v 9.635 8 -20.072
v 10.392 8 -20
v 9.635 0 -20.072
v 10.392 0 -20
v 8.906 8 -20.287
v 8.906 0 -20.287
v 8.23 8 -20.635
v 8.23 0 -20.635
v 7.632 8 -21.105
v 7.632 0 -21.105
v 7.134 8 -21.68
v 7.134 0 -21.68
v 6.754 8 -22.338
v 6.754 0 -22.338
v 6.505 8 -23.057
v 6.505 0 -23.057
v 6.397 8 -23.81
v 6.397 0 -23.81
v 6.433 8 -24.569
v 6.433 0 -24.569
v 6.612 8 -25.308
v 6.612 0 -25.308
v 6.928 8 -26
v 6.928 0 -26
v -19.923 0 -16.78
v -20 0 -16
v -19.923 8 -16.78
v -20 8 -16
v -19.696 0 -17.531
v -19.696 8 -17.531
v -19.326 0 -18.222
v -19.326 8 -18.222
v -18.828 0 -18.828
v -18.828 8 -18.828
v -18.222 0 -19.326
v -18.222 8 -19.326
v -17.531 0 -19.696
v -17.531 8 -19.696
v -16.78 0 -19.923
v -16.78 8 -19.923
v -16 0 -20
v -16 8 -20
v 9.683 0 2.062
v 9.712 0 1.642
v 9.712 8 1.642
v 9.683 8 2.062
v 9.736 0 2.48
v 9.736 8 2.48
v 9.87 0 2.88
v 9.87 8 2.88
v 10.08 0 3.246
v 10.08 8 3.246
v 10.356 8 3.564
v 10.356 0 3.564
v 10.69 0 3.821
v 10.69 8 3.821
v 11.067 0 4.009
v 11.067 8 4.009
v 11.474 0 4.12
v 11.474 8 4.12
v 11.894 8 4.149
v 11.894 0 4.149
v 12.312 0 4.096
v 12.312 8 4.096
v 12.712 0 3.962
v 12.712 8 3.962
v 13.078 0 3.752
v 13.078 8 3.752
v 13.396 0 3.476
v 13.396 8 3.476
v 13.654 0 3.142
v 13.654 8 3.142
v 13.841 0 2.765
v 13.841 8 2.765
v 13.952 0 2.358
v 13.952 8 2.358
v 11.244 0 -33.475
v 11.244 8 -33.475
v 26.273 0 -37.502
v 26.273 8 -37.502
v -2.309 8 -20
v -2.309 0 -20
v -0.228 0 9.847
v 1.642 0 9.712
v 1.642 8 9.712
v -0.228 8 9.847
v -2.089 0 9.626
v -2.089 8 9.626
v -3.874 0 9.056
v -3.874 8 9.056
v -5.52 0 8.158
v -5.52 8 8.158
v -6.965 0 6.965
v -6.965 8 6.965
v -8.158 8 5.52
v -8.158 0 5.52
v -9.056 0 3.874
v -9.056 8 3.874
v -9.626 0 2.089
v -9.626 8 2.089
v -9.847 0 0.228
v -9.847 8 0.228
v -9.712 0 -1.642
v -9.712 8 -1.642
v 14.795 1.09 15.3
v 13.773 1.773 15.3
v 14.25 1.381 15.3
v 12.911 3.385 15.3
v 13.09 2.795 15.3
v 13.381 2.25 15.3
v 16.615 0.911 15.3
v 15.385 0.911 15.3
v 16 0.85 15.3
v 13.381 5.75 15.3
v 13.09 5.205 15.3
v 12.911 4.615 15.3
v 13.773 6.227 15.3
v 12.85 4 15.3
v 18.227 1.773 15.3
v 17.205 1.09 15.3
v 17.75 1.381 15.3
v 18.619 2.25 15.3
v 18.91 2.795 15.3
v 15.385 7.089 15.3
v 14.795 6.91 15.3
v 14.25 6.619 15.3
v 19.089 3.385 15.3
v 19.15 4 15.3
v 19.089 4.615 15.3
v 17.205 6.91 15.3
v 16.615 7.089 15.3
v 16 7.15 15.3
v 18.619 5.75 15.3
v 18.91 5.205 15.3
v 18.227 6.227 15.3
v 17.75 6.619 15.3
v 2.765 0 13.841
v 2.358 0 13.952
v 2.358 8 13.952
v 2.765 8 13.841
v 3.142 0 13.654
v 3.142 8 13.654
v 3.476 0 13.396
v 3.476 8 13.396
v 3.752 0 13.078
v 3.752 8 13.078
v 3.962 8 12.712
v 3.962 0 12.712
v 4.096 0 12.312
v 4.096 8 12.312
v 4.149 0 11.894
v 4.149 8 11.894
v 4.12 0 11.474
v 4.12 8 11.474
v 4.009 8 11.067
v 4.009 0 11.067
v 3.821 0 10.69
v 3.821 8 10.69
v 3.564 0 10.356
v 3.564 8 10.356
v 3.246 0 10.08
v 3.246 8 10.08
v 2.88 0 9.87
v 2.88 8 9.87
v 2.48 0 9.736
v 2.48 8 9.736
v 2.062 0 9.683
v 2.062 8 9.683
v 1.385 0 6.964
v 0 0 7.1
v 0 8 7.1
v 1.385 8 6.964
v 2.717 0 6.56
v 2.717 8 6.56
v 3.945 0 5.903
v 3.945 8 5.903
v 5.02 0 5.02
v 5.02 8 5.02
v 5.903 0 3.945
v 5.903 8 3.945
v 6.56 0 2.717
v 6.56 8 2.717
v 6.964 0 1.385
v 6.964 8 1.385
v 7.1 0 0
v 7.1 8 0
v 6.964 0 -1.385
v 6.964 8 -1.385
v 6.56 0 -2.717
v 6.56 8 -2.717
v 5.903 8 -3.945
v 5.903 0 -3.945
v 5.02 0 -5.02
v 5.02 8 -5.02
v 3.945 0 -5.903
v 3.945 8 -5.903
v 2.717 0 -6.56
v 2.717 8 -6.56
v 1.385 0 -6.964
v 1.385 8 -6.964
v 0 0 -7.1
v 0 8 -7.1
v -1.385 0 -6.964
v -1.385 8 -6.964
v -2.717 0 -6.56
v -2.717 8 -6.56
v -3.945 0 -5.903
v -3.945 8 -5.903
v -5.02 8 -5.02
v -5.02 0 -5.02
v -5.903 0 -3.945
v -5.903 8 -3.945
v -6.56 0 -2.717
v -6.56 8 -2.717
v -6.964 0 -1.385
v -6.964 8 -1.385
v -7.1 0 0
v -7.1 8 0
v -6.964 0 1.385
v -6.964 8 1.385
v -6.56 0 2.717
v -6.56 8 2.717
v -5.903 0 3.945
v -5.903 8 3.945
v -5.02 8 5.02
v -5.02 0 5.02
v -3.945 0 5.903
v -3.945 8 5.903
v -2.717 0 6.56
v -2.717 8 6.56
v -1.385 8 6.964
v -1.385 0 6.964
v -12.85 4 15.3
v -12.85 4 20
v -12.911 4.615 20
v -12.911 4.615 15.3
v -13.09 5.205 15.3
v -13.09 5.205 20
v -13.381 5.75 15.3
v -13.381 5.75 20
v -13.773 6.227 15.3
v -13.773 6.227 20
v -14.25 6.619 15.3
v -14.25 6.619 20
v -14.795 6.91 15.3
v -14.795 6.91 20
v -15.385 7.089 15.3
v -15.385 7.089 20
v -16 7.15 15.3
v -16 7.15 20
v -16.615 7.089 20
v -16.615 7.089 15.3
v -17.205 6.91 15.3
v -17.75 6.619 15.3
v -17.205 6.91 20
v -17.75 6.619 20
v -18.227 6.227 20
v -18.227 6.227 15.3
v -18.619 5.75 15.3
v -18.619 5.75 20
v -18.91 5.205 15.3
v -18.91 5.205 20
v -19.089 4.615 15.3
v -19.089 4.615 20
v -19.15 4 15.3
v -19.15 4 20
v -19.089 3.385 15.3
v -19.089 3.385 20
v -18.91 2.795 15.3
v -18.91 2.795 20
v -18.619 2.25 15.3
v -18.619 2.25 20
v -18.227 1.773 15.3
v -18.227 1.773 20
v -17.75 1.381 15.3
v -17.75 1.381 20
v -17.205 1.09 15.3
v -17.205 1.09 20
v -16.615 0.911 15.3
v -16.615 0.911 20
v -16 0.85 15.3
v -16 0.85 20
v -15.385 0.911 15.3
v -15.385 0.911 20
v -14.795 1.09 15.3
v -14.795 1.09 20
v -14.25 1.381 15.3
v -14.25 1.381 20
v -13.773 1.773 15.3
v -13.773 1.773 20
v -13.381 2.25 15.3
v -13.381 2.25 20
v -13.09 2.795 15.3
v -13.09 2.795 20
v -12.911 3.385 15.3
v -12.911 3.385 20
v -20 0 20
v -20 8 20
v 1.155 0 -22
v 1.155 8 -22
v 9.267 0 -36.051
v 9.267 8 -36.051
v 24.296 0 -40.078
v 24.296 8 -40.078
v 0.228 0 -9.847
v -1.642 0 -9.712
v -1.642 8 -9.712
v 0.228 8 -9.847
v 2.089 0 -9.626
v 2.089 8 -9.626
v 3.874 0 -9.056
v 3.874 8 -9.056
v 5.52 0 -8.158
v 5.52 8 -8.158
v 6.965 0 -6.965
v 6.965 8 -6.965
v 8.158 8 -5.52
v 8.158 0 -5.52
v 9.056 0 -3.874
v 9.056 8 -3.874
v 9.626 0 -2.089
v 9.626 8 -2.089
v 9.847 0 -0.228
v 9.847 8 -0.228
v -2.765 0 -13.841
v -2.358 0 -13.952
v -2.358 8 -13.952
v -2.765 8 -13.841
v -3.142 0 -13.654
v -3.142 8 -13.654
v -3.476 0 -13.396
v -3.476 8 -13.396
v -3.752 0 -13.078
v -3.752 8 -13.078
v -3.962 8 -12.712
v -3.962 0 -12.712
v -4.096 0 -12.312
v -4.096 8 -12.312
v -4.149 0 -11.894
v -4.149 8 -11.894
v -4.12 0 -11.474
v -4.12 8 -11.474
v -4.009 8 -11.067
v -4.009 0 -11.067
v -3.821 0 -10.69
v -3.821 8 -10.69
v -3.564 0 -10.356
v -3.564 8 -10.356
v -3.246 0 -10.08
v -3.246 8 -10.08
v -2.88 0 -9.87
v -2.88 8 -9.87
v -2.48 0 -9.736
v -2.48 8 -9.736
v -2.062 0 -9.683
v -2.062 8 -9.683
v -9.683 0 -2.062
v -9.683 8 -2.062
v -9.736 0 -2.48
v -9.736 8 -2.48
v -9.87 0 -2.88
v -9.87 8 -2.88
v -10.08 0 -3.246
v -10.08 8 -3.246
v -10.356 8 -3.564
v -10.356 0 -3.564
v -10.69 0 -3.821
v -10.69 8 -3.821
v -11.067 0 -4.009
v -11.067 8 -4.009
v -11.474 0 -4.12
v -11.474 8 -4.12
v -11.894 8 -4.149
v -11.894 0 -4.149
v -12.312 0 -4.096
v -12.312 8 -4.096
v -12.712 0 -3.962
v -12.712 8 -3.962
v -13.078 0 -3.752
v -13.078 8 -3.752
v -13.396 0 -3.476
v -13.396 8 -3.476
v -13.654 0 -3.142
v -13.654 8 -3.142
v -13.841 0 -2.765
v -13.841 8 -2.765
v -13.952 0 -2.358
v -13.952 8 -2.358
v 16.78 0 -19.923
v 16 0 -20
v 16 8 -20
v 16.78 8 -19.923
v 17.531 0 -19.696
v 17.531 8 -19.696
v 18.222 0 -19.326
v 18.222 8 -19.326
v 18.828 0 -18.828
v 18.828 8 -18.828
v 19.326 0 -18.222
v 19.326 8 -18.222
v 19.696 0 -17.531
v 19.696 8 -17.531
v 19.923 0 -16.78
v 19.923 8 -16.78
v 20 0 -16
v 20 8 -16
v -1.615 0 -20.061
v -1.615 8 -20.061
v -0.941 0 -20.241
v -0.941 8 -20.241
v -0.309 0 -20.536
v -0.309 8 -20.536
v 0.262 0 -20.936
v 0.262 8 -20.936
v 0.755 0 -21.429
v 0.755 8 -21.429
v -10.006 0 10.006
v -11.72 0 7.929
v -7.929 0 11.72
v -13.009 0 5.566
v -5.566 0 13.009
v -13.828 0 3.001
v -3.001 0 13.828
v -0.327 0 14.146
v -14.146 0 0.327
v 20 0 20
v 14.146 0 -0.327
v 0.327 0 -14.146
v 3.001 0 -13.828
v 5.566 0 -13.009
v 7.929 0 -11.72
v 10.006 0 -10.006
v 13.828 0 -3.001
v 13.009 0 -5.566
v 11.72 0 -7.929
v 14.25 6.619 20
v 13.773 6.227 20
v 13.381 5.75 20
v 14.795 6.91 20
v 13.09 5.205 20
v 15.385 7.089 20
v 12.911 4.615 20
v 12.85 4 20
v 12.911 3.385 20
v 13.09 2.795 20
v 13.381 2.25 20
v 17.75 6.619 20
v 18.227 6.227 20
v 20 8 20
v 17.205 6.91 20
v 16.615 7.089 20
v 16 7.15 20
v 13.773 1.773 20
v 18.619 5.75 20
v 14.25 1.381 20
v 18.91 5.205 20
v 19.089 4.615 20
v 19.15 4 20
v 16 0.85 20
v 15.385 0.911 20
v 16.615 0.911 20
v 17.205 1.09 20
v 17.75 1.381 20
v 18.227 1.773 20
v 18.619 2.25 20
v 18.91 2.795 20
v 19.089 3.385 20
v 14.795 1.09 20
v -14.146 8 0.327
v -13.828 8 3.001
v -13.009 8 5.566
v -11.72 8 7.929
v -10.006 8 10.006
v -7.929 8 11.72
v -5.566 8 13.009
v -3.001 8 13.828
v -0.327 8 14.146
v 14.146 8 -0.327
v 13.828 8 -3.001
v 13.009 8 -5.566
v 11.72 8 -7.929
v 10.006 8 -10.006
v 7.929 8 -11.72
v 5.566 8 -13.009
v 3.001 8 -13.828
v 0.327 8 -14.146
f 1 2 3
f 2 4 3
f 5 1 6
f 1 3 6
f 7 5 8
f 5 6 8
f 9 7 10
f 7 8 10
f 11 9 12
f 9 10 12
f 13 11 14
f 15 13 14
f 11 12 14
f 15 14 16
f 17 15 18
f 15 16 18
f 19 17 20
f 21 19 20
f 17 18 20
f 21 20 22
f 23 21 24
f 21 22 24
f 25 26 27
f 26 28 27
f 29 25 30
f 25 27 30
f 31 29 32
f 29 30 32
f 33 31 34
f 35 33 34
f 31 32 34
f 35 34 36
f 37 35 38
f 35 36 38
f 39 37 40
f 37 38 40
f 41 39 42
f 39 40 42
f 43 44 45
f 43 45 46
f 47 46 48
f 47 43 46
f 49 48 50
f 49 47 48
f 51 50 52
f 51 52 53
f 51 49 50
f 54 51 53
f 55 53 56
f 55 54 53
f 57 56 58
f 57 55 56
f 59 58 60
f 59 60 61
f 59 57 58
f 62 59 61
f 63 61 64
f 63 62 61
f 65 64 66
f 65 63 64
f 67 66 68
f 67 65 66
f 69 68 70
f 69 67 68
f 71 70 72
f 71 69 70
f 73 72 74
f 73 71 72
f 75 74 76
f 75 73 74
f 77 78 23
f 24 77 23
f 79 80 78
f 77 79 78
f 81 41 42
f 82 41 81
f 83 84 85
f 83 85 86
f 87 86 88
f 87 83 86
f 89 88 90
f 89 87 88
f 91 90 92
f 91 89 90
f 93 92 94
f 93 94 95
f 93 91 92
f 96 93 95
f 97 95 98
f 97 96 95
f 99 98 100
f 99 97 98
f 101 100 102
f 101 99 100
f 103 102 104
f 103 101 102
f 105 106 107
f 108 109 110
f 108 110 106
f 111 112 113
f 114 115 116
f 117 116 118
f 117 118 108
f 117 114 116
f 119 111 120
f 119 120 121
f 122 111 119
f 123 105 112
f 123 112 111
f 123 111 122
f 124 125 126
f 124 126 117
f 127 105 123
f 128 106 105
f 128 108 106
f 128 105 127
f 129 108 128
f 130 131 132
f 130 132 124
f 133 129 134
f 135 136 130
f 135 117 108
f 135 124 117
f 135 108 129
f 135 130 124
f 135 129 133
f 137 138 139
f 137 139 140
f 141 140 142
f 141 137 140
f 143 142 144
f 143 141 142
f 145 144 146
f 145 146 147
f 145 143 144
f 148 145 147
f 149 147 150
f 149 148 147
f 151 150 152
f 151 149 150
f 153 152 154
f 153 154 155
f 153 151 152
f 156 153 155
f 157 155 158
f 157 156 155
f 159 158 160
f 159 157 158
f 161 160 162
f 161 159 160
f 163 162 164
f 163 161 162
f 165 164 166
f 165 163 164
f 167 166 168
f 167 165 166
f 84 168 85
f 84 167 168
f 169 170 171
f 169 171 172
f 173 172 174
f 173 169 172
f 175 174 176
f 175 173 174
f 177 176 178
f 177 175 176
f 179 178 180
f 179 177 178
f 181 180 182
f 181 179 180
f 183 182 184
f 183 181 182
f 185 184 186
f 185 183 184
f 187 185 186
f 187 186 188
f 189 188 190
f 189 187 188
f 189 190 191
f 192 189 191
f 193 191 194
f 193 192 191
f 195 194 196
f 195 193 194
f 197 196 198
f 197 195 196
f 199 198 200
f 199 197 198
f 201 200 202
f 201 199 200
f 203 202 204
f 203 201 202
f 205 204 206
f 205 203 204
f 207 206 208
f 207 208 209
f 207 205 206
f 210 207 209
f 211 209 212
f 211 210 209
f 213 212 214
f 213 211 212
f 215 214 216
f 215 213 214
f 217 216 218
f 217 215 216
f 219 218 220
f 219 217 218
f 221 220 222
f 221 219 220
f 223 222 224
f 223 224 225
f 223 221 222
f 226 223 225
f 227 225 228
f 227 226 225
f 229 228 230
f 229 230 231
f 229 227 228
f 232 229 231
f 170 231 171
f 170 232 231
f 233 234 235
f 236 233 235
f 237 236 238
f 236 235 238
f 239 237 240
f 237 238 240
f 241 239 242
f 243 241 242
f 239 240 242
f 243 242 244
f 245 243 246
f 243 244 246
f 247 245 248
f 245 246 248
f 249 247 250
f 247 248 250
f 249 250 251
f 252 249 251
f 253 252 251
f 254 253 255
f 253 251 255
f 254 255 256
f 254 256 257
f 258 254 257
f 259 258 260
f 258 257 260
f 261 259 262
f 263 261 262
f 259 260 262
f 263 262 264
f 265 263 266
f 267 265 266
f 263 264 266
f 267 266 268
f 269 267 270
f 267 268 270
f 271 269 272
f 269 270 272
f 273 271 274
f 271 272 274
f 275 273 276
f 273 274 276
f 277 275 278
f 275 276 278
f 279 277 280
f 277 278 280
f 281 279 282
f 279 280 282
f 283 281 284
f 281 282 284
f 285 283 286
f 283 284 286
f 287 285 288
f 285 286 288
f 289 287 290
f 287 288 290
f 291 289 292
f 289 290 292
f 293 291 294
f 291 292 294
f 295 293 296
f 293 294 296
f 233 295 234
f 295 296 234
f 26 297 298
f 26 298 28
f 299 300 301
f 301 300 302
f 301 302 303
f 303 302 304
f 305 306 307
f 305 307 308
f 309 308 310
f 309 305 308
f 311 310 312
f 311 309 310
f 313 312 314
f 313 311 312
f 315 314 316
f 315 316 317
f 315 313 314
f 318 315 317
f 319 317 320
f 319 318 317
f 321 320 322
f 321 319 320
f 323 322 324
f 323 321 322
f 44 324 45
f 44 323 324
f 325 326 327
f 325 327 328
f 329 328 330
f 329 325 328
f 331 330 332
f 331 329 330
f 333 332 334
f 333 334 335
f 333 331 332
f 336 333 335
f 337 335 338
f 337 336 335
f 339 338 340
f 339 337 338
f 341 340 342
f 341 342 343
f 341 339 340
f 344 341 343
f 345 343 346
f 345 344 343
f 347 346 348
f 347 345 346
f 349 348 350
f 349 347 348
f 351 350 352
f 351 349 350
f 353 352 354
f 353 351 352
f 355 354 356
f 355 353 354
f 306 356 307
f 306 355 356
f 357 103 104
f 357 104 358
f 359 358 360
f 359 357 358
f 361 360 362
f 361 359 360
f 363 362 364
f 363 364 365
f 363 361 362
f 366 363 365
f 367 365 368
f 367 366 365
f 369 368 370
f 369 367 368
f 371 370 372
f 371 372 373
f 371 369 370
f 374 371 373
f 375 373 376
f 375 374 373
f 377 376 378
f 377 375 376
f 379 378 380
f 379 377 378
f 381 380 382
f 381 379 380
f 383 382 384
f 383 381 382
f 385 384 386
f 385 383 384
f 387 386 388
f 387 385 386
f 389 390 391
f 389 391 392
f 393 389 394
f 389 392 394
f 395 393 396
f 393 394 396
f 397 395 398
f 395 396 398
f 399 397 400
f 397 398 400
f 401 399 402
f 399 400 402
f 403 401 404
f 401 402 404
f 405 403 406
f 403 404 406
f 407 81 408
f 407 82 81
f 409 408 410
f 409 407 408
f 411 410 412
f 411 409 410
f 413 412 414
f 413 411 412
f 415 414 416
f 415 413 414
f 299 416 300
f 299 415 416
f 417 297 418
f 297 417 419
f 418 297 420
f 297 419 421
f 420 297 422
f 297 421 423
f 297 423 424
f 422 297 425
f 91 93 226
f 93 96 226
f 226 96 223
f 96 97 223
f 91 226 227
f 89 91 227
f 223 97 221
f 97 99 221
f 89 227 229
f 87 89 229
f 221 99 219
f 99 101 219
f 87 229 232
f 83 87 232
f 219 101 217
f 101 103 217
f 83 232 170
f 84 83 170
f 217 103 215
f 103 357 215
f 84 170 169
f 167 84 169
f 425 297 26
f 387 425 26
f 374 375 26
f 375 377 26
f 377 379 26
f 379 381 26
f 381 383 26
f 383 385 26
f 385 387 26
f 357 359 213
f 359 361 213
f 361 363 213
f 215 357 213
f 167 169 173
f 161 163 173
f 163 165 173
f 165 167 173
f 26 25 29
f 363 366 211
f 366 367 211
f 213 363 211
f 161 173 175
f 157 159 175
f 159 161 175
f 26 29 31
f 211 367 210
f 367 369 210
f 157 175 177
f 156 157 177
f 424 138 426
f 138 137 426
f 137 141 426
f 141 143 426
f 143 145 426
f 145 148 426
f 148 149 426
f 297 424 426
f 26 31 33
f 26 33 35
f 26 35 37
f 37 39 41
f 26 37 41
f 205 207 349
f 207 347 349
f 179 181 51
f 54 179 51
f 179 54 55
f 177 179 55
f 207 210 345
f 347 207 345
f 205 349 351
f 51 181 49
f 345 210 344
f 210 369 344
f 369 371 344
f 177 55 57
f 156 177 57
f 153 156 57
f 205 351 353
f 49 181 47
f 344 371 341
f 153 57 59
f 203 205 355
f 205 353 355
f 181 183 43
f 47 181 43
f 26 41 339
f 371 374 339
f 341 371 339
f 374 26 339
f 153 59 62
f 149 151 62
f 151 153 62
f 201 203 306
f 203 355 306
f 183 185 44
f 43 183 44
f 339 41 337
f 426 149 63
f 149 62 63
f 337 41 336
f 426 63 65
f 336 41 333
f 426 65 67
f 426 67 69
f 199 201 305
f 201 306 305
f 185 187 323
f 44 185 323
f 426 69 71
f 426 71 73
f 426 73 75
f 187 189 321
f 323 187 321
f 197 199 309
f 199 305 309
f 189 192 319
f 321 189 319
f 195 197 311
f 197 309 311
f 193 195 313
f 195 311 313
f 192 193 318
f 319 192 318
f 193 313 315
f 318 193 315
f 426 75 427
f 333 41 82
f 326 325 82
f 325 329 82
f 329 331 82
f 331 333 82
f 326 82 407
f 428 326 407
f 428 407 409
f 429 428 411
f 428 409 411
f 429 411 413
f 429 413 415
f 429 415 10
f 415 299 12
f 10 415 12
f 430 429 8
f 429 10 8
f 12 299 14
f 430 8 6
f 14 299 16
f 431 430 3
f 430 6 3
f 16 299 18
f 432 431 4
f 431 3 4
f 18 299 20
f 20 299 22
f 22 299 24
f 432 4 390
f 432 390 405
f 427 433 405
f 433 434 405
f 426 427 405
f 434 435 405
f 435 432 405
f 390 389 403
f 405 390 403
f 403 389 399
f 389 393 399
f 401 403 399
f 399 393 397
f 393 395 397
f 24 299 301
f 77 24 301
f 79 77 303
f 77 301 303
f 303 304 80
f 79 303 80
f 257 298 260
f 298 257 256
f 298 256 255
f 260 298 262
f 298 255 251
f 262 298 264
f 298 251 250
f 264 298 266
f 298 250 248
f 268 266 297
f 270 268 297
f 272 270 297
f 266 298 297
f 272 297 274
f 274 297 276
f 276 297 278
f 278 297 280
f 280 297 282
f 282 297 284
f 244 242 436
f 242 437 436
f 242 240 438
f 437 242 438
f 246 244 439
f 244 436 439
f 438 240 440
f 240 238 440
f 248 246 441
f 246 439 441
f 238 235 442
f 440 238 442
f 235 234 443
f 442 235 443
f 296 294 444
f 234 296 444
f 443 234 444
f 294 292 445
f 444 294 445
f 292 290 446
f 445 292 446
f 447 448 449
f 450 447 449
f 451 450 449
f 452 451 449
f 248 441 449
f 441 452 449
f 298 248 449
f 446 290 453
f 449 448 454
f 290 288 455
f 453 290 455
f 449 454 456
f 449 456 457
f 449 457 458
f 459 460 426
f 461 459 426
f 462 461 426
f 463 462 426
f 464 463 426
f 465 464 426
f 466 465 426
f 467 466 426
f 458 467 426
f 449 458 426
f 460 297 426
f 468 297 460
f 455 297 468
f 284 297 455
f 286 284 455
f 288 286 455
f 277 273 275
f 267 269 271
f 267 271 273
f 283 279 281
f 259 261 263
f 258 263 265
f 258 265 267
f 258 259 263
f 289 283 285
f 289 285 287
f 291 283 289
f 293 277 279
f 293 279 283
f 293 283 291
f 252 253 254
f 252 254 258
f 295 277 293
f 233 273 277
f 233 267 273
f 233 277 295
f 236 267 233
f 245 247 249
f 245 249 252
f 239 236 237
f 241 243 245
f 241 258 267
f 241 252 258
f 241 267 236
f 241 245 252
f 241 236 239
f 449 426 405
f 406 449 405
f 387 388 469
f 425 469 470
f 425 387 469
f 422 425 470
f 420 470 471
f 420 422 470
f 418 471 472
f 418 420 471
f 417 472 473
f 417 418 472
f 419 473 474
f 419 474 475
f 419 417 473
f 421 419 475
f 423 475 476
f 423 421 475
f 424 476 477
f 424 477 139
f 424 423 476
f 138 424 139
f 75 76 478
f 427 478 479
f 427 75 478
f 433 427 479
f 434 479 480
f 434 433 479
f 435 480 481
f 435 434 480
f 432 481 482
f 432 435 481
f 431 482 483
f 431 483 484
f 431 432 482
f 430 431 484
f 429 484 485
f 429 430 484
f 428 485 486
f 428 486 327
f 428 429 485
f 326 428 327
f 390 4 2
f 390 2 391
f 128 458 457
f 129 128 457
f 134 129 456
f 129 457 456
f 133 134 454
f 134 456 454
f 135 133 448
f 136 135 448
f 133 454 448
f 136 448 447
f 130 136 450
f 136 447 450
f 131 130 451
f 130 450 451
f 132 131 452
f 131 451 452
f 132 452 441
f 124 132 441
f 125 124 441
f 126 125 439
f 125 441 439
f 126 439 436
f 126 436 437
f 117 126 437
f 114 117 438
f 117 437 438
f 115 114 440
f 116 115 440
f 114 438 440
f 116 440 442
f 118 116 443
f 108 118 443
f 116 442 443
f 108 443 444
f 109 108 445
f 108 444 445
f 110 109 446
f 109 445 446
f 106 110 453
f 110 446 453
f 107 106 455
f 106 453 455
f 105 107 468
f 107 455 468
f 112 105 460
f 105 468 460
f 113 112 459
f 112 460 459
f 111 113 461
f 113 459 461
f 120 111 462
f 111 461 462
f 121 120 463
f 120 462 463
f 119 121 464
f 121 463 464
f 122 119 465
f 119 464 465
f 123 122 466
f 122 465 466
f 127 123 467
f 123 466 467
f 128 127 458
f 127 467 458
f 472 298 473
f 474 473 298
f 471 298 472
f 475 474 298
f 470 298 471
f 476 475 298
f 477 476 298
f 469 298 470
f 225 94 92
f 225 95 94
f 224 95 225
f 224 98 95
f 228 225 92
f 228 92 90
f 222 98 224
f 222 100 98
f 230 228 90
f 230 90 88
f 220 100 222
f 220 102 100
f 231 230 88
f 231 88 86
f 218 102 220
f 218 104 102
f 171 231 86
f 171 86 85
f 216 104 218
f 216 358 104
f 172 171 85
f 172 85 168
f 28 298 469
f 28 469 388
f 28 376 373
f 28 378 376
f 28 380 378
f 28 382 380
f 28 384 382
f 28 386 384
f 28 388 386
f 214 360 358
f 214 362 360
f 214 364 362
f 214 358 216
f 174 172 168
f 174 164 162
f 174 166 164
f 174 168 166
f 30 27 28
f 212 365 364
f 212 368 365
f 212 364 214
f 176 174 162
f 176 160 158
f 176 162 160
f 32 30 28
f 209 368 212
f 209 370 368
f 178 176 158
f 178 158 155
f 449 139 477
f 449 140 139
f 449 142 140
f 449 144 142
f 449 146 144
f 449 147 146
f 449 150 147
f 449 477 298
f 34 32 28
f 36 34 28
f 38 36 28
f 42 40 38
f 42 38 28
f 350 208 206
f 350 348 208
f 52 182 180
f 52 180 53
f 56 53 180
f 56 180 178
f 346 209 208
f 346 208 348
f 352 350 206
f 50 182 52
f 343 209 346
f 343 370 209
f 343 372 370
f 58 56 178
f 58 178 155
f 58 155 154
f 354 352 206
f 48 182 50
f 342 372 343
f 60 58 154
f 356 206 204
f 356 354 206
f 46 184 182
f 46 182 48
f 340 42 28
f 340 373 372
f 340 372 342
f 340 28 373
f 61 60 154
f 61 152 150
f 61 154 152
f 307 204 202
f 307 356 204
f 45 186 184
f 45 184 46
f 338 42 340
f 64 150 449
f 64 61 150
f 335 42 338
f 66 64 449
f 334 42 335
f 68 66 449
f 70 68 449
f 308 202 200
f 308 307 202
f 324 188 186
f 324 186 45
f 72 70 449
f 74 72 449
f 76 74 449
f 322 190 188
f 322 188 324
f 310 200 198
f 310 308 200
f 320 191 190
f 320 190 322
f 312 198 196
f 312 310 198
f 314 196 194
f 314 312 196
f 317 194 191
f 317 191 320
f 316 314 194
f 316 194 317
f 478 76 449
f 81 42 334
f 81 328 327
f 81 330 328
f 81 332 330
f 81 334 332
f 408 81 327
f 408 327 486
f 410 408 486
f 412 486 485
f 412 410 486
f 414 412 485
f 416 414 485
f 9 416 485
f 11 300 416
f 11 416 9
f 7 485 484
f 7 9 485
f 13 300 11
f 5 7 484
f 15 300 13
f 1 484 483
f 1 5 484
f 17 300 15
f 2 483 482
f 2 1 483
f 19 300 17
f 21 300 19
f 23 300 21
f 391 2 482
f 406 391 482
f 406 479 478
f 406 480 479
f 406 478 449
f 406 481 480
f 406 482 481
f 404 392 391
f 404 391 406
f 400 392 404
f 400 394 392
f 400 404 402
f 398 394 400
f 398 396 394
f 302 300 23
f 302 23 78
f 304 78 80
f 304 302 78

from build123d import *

# Parameters (mm, degrees)
SKETCH1_W           = 40
SKETCH1_H           = 40
SKETCH1_R           = 7.1
BOSS_EXTRUDE1_DEPTH = 8
FILLET1_R           = 4
SKETCH2_R           = 3.15
CUT_EXTRUDE1_DEPTH  = 4.7
BOSS_EXTRUDE2_DEPTH = 8
FILLET2_R           = 4


with BuildPart() as part:
    # Sketch1 → Boss-Extrude1 (new body)
    with BuildSketch(Plane(origin=(0, 0, 0), x_dir=(1, 0, 0), z_dir=(0, 1, 0))):
        Rectangle(SKETCH1_W, SKETCH1_H)
        with Locations(Location((0, 0, 0), (0, 0, 270))):
            Circle(SKETCH1_R, mode=Mode.SUBTRACT)
        with BuildLine():
            ThreePointArc((-1.641666667, 9.712230977), (6.965001795, 6.965001795), (9.712230977, -1.641666667))
            ThreePointArc((9.712230977, -1.641666667), (11.473826233, -4.119928589), (13.952088155, -2.358333333))
            ThreePointArc((13.952088155, -2.358333333), (10.005560954, 10.005560954), (-2.358333333, 13.952088155))
            ThreePointArc((-2.358333333, 13.952088155), (-4.119928589, 11.473826233), (-1.641666667, 9.712230977))
        make_face(mode=Mode.SUBTRACT)
        with BuildLine():
            ThreePointArc((-13.952088155, 2.358333333), (-10.005560954, -10.005560954), (2.358333333, -13.952088155))
            ThreePointArc((2.358333333, -13.952088155), (4.119928589, -11.473826233), (1.641666667, -9.712230977))
            ThreePointArc((1.641666667, -9.712230977), (-6.965001795, -6.965001795), (-9.712230977, 1.641666667))
            ThreePointArc((-9.712230977, 1.641666667), (-11.473826233, 4.119928589), (-13.952088155, 2.358333333))
        make_face(mode=Mode.SUBTRACT)
    extrude(amount=BOSS_EXTRUDE1_DEPTH)

    # Fillet1
    fillet1_edges = [part.edges().sort_by_distance(p)[0] for p in [
        (-20, 4, -20),
        (20, 4, -20),
    ]]
    fillet(fillet1_edges, radius=FILLET1_R)

    # Sketch2 → Cut-Extrude1 (cut)
    with BuildSketch(Plane.XY.offset(20)):
        with Locations((-16, 4)):
            Circle(SKETCH2_R)
        with Locations((16, 4)):
            Circle(SKETCH2_R)
    extrude(amount=-CUT_EXTRUDE1_DEPTH, mode=Mode.SUBTRACT)

    # Sketch3 → Boss-Extrude2 (add)
    with BuildSketch(Plane(origin=(0, 8, 0), x_dir=(1, 0, 0), z_dir=(0, 1, 0))):
        Polygon((0, 20), (9.266942717, 36.050815617), (24.295969979, 40.077831335), (26.272725847, 37.501672932), (11.243698585, 33.474657214), (3.464101615, 20), align=None)
    extrude(amount=-BOSS_EXTRUDE2_DEPTH)

    # Fillet2
    fillet2_edges = [part.edges().sort_by_distance(p)[0] for p in [
        (3.464101615, 4, -20),
        (0, 4, -20),
    ]]
    fillet(fillet2_edges, radius=FILLET2_R)


solid = part.part
